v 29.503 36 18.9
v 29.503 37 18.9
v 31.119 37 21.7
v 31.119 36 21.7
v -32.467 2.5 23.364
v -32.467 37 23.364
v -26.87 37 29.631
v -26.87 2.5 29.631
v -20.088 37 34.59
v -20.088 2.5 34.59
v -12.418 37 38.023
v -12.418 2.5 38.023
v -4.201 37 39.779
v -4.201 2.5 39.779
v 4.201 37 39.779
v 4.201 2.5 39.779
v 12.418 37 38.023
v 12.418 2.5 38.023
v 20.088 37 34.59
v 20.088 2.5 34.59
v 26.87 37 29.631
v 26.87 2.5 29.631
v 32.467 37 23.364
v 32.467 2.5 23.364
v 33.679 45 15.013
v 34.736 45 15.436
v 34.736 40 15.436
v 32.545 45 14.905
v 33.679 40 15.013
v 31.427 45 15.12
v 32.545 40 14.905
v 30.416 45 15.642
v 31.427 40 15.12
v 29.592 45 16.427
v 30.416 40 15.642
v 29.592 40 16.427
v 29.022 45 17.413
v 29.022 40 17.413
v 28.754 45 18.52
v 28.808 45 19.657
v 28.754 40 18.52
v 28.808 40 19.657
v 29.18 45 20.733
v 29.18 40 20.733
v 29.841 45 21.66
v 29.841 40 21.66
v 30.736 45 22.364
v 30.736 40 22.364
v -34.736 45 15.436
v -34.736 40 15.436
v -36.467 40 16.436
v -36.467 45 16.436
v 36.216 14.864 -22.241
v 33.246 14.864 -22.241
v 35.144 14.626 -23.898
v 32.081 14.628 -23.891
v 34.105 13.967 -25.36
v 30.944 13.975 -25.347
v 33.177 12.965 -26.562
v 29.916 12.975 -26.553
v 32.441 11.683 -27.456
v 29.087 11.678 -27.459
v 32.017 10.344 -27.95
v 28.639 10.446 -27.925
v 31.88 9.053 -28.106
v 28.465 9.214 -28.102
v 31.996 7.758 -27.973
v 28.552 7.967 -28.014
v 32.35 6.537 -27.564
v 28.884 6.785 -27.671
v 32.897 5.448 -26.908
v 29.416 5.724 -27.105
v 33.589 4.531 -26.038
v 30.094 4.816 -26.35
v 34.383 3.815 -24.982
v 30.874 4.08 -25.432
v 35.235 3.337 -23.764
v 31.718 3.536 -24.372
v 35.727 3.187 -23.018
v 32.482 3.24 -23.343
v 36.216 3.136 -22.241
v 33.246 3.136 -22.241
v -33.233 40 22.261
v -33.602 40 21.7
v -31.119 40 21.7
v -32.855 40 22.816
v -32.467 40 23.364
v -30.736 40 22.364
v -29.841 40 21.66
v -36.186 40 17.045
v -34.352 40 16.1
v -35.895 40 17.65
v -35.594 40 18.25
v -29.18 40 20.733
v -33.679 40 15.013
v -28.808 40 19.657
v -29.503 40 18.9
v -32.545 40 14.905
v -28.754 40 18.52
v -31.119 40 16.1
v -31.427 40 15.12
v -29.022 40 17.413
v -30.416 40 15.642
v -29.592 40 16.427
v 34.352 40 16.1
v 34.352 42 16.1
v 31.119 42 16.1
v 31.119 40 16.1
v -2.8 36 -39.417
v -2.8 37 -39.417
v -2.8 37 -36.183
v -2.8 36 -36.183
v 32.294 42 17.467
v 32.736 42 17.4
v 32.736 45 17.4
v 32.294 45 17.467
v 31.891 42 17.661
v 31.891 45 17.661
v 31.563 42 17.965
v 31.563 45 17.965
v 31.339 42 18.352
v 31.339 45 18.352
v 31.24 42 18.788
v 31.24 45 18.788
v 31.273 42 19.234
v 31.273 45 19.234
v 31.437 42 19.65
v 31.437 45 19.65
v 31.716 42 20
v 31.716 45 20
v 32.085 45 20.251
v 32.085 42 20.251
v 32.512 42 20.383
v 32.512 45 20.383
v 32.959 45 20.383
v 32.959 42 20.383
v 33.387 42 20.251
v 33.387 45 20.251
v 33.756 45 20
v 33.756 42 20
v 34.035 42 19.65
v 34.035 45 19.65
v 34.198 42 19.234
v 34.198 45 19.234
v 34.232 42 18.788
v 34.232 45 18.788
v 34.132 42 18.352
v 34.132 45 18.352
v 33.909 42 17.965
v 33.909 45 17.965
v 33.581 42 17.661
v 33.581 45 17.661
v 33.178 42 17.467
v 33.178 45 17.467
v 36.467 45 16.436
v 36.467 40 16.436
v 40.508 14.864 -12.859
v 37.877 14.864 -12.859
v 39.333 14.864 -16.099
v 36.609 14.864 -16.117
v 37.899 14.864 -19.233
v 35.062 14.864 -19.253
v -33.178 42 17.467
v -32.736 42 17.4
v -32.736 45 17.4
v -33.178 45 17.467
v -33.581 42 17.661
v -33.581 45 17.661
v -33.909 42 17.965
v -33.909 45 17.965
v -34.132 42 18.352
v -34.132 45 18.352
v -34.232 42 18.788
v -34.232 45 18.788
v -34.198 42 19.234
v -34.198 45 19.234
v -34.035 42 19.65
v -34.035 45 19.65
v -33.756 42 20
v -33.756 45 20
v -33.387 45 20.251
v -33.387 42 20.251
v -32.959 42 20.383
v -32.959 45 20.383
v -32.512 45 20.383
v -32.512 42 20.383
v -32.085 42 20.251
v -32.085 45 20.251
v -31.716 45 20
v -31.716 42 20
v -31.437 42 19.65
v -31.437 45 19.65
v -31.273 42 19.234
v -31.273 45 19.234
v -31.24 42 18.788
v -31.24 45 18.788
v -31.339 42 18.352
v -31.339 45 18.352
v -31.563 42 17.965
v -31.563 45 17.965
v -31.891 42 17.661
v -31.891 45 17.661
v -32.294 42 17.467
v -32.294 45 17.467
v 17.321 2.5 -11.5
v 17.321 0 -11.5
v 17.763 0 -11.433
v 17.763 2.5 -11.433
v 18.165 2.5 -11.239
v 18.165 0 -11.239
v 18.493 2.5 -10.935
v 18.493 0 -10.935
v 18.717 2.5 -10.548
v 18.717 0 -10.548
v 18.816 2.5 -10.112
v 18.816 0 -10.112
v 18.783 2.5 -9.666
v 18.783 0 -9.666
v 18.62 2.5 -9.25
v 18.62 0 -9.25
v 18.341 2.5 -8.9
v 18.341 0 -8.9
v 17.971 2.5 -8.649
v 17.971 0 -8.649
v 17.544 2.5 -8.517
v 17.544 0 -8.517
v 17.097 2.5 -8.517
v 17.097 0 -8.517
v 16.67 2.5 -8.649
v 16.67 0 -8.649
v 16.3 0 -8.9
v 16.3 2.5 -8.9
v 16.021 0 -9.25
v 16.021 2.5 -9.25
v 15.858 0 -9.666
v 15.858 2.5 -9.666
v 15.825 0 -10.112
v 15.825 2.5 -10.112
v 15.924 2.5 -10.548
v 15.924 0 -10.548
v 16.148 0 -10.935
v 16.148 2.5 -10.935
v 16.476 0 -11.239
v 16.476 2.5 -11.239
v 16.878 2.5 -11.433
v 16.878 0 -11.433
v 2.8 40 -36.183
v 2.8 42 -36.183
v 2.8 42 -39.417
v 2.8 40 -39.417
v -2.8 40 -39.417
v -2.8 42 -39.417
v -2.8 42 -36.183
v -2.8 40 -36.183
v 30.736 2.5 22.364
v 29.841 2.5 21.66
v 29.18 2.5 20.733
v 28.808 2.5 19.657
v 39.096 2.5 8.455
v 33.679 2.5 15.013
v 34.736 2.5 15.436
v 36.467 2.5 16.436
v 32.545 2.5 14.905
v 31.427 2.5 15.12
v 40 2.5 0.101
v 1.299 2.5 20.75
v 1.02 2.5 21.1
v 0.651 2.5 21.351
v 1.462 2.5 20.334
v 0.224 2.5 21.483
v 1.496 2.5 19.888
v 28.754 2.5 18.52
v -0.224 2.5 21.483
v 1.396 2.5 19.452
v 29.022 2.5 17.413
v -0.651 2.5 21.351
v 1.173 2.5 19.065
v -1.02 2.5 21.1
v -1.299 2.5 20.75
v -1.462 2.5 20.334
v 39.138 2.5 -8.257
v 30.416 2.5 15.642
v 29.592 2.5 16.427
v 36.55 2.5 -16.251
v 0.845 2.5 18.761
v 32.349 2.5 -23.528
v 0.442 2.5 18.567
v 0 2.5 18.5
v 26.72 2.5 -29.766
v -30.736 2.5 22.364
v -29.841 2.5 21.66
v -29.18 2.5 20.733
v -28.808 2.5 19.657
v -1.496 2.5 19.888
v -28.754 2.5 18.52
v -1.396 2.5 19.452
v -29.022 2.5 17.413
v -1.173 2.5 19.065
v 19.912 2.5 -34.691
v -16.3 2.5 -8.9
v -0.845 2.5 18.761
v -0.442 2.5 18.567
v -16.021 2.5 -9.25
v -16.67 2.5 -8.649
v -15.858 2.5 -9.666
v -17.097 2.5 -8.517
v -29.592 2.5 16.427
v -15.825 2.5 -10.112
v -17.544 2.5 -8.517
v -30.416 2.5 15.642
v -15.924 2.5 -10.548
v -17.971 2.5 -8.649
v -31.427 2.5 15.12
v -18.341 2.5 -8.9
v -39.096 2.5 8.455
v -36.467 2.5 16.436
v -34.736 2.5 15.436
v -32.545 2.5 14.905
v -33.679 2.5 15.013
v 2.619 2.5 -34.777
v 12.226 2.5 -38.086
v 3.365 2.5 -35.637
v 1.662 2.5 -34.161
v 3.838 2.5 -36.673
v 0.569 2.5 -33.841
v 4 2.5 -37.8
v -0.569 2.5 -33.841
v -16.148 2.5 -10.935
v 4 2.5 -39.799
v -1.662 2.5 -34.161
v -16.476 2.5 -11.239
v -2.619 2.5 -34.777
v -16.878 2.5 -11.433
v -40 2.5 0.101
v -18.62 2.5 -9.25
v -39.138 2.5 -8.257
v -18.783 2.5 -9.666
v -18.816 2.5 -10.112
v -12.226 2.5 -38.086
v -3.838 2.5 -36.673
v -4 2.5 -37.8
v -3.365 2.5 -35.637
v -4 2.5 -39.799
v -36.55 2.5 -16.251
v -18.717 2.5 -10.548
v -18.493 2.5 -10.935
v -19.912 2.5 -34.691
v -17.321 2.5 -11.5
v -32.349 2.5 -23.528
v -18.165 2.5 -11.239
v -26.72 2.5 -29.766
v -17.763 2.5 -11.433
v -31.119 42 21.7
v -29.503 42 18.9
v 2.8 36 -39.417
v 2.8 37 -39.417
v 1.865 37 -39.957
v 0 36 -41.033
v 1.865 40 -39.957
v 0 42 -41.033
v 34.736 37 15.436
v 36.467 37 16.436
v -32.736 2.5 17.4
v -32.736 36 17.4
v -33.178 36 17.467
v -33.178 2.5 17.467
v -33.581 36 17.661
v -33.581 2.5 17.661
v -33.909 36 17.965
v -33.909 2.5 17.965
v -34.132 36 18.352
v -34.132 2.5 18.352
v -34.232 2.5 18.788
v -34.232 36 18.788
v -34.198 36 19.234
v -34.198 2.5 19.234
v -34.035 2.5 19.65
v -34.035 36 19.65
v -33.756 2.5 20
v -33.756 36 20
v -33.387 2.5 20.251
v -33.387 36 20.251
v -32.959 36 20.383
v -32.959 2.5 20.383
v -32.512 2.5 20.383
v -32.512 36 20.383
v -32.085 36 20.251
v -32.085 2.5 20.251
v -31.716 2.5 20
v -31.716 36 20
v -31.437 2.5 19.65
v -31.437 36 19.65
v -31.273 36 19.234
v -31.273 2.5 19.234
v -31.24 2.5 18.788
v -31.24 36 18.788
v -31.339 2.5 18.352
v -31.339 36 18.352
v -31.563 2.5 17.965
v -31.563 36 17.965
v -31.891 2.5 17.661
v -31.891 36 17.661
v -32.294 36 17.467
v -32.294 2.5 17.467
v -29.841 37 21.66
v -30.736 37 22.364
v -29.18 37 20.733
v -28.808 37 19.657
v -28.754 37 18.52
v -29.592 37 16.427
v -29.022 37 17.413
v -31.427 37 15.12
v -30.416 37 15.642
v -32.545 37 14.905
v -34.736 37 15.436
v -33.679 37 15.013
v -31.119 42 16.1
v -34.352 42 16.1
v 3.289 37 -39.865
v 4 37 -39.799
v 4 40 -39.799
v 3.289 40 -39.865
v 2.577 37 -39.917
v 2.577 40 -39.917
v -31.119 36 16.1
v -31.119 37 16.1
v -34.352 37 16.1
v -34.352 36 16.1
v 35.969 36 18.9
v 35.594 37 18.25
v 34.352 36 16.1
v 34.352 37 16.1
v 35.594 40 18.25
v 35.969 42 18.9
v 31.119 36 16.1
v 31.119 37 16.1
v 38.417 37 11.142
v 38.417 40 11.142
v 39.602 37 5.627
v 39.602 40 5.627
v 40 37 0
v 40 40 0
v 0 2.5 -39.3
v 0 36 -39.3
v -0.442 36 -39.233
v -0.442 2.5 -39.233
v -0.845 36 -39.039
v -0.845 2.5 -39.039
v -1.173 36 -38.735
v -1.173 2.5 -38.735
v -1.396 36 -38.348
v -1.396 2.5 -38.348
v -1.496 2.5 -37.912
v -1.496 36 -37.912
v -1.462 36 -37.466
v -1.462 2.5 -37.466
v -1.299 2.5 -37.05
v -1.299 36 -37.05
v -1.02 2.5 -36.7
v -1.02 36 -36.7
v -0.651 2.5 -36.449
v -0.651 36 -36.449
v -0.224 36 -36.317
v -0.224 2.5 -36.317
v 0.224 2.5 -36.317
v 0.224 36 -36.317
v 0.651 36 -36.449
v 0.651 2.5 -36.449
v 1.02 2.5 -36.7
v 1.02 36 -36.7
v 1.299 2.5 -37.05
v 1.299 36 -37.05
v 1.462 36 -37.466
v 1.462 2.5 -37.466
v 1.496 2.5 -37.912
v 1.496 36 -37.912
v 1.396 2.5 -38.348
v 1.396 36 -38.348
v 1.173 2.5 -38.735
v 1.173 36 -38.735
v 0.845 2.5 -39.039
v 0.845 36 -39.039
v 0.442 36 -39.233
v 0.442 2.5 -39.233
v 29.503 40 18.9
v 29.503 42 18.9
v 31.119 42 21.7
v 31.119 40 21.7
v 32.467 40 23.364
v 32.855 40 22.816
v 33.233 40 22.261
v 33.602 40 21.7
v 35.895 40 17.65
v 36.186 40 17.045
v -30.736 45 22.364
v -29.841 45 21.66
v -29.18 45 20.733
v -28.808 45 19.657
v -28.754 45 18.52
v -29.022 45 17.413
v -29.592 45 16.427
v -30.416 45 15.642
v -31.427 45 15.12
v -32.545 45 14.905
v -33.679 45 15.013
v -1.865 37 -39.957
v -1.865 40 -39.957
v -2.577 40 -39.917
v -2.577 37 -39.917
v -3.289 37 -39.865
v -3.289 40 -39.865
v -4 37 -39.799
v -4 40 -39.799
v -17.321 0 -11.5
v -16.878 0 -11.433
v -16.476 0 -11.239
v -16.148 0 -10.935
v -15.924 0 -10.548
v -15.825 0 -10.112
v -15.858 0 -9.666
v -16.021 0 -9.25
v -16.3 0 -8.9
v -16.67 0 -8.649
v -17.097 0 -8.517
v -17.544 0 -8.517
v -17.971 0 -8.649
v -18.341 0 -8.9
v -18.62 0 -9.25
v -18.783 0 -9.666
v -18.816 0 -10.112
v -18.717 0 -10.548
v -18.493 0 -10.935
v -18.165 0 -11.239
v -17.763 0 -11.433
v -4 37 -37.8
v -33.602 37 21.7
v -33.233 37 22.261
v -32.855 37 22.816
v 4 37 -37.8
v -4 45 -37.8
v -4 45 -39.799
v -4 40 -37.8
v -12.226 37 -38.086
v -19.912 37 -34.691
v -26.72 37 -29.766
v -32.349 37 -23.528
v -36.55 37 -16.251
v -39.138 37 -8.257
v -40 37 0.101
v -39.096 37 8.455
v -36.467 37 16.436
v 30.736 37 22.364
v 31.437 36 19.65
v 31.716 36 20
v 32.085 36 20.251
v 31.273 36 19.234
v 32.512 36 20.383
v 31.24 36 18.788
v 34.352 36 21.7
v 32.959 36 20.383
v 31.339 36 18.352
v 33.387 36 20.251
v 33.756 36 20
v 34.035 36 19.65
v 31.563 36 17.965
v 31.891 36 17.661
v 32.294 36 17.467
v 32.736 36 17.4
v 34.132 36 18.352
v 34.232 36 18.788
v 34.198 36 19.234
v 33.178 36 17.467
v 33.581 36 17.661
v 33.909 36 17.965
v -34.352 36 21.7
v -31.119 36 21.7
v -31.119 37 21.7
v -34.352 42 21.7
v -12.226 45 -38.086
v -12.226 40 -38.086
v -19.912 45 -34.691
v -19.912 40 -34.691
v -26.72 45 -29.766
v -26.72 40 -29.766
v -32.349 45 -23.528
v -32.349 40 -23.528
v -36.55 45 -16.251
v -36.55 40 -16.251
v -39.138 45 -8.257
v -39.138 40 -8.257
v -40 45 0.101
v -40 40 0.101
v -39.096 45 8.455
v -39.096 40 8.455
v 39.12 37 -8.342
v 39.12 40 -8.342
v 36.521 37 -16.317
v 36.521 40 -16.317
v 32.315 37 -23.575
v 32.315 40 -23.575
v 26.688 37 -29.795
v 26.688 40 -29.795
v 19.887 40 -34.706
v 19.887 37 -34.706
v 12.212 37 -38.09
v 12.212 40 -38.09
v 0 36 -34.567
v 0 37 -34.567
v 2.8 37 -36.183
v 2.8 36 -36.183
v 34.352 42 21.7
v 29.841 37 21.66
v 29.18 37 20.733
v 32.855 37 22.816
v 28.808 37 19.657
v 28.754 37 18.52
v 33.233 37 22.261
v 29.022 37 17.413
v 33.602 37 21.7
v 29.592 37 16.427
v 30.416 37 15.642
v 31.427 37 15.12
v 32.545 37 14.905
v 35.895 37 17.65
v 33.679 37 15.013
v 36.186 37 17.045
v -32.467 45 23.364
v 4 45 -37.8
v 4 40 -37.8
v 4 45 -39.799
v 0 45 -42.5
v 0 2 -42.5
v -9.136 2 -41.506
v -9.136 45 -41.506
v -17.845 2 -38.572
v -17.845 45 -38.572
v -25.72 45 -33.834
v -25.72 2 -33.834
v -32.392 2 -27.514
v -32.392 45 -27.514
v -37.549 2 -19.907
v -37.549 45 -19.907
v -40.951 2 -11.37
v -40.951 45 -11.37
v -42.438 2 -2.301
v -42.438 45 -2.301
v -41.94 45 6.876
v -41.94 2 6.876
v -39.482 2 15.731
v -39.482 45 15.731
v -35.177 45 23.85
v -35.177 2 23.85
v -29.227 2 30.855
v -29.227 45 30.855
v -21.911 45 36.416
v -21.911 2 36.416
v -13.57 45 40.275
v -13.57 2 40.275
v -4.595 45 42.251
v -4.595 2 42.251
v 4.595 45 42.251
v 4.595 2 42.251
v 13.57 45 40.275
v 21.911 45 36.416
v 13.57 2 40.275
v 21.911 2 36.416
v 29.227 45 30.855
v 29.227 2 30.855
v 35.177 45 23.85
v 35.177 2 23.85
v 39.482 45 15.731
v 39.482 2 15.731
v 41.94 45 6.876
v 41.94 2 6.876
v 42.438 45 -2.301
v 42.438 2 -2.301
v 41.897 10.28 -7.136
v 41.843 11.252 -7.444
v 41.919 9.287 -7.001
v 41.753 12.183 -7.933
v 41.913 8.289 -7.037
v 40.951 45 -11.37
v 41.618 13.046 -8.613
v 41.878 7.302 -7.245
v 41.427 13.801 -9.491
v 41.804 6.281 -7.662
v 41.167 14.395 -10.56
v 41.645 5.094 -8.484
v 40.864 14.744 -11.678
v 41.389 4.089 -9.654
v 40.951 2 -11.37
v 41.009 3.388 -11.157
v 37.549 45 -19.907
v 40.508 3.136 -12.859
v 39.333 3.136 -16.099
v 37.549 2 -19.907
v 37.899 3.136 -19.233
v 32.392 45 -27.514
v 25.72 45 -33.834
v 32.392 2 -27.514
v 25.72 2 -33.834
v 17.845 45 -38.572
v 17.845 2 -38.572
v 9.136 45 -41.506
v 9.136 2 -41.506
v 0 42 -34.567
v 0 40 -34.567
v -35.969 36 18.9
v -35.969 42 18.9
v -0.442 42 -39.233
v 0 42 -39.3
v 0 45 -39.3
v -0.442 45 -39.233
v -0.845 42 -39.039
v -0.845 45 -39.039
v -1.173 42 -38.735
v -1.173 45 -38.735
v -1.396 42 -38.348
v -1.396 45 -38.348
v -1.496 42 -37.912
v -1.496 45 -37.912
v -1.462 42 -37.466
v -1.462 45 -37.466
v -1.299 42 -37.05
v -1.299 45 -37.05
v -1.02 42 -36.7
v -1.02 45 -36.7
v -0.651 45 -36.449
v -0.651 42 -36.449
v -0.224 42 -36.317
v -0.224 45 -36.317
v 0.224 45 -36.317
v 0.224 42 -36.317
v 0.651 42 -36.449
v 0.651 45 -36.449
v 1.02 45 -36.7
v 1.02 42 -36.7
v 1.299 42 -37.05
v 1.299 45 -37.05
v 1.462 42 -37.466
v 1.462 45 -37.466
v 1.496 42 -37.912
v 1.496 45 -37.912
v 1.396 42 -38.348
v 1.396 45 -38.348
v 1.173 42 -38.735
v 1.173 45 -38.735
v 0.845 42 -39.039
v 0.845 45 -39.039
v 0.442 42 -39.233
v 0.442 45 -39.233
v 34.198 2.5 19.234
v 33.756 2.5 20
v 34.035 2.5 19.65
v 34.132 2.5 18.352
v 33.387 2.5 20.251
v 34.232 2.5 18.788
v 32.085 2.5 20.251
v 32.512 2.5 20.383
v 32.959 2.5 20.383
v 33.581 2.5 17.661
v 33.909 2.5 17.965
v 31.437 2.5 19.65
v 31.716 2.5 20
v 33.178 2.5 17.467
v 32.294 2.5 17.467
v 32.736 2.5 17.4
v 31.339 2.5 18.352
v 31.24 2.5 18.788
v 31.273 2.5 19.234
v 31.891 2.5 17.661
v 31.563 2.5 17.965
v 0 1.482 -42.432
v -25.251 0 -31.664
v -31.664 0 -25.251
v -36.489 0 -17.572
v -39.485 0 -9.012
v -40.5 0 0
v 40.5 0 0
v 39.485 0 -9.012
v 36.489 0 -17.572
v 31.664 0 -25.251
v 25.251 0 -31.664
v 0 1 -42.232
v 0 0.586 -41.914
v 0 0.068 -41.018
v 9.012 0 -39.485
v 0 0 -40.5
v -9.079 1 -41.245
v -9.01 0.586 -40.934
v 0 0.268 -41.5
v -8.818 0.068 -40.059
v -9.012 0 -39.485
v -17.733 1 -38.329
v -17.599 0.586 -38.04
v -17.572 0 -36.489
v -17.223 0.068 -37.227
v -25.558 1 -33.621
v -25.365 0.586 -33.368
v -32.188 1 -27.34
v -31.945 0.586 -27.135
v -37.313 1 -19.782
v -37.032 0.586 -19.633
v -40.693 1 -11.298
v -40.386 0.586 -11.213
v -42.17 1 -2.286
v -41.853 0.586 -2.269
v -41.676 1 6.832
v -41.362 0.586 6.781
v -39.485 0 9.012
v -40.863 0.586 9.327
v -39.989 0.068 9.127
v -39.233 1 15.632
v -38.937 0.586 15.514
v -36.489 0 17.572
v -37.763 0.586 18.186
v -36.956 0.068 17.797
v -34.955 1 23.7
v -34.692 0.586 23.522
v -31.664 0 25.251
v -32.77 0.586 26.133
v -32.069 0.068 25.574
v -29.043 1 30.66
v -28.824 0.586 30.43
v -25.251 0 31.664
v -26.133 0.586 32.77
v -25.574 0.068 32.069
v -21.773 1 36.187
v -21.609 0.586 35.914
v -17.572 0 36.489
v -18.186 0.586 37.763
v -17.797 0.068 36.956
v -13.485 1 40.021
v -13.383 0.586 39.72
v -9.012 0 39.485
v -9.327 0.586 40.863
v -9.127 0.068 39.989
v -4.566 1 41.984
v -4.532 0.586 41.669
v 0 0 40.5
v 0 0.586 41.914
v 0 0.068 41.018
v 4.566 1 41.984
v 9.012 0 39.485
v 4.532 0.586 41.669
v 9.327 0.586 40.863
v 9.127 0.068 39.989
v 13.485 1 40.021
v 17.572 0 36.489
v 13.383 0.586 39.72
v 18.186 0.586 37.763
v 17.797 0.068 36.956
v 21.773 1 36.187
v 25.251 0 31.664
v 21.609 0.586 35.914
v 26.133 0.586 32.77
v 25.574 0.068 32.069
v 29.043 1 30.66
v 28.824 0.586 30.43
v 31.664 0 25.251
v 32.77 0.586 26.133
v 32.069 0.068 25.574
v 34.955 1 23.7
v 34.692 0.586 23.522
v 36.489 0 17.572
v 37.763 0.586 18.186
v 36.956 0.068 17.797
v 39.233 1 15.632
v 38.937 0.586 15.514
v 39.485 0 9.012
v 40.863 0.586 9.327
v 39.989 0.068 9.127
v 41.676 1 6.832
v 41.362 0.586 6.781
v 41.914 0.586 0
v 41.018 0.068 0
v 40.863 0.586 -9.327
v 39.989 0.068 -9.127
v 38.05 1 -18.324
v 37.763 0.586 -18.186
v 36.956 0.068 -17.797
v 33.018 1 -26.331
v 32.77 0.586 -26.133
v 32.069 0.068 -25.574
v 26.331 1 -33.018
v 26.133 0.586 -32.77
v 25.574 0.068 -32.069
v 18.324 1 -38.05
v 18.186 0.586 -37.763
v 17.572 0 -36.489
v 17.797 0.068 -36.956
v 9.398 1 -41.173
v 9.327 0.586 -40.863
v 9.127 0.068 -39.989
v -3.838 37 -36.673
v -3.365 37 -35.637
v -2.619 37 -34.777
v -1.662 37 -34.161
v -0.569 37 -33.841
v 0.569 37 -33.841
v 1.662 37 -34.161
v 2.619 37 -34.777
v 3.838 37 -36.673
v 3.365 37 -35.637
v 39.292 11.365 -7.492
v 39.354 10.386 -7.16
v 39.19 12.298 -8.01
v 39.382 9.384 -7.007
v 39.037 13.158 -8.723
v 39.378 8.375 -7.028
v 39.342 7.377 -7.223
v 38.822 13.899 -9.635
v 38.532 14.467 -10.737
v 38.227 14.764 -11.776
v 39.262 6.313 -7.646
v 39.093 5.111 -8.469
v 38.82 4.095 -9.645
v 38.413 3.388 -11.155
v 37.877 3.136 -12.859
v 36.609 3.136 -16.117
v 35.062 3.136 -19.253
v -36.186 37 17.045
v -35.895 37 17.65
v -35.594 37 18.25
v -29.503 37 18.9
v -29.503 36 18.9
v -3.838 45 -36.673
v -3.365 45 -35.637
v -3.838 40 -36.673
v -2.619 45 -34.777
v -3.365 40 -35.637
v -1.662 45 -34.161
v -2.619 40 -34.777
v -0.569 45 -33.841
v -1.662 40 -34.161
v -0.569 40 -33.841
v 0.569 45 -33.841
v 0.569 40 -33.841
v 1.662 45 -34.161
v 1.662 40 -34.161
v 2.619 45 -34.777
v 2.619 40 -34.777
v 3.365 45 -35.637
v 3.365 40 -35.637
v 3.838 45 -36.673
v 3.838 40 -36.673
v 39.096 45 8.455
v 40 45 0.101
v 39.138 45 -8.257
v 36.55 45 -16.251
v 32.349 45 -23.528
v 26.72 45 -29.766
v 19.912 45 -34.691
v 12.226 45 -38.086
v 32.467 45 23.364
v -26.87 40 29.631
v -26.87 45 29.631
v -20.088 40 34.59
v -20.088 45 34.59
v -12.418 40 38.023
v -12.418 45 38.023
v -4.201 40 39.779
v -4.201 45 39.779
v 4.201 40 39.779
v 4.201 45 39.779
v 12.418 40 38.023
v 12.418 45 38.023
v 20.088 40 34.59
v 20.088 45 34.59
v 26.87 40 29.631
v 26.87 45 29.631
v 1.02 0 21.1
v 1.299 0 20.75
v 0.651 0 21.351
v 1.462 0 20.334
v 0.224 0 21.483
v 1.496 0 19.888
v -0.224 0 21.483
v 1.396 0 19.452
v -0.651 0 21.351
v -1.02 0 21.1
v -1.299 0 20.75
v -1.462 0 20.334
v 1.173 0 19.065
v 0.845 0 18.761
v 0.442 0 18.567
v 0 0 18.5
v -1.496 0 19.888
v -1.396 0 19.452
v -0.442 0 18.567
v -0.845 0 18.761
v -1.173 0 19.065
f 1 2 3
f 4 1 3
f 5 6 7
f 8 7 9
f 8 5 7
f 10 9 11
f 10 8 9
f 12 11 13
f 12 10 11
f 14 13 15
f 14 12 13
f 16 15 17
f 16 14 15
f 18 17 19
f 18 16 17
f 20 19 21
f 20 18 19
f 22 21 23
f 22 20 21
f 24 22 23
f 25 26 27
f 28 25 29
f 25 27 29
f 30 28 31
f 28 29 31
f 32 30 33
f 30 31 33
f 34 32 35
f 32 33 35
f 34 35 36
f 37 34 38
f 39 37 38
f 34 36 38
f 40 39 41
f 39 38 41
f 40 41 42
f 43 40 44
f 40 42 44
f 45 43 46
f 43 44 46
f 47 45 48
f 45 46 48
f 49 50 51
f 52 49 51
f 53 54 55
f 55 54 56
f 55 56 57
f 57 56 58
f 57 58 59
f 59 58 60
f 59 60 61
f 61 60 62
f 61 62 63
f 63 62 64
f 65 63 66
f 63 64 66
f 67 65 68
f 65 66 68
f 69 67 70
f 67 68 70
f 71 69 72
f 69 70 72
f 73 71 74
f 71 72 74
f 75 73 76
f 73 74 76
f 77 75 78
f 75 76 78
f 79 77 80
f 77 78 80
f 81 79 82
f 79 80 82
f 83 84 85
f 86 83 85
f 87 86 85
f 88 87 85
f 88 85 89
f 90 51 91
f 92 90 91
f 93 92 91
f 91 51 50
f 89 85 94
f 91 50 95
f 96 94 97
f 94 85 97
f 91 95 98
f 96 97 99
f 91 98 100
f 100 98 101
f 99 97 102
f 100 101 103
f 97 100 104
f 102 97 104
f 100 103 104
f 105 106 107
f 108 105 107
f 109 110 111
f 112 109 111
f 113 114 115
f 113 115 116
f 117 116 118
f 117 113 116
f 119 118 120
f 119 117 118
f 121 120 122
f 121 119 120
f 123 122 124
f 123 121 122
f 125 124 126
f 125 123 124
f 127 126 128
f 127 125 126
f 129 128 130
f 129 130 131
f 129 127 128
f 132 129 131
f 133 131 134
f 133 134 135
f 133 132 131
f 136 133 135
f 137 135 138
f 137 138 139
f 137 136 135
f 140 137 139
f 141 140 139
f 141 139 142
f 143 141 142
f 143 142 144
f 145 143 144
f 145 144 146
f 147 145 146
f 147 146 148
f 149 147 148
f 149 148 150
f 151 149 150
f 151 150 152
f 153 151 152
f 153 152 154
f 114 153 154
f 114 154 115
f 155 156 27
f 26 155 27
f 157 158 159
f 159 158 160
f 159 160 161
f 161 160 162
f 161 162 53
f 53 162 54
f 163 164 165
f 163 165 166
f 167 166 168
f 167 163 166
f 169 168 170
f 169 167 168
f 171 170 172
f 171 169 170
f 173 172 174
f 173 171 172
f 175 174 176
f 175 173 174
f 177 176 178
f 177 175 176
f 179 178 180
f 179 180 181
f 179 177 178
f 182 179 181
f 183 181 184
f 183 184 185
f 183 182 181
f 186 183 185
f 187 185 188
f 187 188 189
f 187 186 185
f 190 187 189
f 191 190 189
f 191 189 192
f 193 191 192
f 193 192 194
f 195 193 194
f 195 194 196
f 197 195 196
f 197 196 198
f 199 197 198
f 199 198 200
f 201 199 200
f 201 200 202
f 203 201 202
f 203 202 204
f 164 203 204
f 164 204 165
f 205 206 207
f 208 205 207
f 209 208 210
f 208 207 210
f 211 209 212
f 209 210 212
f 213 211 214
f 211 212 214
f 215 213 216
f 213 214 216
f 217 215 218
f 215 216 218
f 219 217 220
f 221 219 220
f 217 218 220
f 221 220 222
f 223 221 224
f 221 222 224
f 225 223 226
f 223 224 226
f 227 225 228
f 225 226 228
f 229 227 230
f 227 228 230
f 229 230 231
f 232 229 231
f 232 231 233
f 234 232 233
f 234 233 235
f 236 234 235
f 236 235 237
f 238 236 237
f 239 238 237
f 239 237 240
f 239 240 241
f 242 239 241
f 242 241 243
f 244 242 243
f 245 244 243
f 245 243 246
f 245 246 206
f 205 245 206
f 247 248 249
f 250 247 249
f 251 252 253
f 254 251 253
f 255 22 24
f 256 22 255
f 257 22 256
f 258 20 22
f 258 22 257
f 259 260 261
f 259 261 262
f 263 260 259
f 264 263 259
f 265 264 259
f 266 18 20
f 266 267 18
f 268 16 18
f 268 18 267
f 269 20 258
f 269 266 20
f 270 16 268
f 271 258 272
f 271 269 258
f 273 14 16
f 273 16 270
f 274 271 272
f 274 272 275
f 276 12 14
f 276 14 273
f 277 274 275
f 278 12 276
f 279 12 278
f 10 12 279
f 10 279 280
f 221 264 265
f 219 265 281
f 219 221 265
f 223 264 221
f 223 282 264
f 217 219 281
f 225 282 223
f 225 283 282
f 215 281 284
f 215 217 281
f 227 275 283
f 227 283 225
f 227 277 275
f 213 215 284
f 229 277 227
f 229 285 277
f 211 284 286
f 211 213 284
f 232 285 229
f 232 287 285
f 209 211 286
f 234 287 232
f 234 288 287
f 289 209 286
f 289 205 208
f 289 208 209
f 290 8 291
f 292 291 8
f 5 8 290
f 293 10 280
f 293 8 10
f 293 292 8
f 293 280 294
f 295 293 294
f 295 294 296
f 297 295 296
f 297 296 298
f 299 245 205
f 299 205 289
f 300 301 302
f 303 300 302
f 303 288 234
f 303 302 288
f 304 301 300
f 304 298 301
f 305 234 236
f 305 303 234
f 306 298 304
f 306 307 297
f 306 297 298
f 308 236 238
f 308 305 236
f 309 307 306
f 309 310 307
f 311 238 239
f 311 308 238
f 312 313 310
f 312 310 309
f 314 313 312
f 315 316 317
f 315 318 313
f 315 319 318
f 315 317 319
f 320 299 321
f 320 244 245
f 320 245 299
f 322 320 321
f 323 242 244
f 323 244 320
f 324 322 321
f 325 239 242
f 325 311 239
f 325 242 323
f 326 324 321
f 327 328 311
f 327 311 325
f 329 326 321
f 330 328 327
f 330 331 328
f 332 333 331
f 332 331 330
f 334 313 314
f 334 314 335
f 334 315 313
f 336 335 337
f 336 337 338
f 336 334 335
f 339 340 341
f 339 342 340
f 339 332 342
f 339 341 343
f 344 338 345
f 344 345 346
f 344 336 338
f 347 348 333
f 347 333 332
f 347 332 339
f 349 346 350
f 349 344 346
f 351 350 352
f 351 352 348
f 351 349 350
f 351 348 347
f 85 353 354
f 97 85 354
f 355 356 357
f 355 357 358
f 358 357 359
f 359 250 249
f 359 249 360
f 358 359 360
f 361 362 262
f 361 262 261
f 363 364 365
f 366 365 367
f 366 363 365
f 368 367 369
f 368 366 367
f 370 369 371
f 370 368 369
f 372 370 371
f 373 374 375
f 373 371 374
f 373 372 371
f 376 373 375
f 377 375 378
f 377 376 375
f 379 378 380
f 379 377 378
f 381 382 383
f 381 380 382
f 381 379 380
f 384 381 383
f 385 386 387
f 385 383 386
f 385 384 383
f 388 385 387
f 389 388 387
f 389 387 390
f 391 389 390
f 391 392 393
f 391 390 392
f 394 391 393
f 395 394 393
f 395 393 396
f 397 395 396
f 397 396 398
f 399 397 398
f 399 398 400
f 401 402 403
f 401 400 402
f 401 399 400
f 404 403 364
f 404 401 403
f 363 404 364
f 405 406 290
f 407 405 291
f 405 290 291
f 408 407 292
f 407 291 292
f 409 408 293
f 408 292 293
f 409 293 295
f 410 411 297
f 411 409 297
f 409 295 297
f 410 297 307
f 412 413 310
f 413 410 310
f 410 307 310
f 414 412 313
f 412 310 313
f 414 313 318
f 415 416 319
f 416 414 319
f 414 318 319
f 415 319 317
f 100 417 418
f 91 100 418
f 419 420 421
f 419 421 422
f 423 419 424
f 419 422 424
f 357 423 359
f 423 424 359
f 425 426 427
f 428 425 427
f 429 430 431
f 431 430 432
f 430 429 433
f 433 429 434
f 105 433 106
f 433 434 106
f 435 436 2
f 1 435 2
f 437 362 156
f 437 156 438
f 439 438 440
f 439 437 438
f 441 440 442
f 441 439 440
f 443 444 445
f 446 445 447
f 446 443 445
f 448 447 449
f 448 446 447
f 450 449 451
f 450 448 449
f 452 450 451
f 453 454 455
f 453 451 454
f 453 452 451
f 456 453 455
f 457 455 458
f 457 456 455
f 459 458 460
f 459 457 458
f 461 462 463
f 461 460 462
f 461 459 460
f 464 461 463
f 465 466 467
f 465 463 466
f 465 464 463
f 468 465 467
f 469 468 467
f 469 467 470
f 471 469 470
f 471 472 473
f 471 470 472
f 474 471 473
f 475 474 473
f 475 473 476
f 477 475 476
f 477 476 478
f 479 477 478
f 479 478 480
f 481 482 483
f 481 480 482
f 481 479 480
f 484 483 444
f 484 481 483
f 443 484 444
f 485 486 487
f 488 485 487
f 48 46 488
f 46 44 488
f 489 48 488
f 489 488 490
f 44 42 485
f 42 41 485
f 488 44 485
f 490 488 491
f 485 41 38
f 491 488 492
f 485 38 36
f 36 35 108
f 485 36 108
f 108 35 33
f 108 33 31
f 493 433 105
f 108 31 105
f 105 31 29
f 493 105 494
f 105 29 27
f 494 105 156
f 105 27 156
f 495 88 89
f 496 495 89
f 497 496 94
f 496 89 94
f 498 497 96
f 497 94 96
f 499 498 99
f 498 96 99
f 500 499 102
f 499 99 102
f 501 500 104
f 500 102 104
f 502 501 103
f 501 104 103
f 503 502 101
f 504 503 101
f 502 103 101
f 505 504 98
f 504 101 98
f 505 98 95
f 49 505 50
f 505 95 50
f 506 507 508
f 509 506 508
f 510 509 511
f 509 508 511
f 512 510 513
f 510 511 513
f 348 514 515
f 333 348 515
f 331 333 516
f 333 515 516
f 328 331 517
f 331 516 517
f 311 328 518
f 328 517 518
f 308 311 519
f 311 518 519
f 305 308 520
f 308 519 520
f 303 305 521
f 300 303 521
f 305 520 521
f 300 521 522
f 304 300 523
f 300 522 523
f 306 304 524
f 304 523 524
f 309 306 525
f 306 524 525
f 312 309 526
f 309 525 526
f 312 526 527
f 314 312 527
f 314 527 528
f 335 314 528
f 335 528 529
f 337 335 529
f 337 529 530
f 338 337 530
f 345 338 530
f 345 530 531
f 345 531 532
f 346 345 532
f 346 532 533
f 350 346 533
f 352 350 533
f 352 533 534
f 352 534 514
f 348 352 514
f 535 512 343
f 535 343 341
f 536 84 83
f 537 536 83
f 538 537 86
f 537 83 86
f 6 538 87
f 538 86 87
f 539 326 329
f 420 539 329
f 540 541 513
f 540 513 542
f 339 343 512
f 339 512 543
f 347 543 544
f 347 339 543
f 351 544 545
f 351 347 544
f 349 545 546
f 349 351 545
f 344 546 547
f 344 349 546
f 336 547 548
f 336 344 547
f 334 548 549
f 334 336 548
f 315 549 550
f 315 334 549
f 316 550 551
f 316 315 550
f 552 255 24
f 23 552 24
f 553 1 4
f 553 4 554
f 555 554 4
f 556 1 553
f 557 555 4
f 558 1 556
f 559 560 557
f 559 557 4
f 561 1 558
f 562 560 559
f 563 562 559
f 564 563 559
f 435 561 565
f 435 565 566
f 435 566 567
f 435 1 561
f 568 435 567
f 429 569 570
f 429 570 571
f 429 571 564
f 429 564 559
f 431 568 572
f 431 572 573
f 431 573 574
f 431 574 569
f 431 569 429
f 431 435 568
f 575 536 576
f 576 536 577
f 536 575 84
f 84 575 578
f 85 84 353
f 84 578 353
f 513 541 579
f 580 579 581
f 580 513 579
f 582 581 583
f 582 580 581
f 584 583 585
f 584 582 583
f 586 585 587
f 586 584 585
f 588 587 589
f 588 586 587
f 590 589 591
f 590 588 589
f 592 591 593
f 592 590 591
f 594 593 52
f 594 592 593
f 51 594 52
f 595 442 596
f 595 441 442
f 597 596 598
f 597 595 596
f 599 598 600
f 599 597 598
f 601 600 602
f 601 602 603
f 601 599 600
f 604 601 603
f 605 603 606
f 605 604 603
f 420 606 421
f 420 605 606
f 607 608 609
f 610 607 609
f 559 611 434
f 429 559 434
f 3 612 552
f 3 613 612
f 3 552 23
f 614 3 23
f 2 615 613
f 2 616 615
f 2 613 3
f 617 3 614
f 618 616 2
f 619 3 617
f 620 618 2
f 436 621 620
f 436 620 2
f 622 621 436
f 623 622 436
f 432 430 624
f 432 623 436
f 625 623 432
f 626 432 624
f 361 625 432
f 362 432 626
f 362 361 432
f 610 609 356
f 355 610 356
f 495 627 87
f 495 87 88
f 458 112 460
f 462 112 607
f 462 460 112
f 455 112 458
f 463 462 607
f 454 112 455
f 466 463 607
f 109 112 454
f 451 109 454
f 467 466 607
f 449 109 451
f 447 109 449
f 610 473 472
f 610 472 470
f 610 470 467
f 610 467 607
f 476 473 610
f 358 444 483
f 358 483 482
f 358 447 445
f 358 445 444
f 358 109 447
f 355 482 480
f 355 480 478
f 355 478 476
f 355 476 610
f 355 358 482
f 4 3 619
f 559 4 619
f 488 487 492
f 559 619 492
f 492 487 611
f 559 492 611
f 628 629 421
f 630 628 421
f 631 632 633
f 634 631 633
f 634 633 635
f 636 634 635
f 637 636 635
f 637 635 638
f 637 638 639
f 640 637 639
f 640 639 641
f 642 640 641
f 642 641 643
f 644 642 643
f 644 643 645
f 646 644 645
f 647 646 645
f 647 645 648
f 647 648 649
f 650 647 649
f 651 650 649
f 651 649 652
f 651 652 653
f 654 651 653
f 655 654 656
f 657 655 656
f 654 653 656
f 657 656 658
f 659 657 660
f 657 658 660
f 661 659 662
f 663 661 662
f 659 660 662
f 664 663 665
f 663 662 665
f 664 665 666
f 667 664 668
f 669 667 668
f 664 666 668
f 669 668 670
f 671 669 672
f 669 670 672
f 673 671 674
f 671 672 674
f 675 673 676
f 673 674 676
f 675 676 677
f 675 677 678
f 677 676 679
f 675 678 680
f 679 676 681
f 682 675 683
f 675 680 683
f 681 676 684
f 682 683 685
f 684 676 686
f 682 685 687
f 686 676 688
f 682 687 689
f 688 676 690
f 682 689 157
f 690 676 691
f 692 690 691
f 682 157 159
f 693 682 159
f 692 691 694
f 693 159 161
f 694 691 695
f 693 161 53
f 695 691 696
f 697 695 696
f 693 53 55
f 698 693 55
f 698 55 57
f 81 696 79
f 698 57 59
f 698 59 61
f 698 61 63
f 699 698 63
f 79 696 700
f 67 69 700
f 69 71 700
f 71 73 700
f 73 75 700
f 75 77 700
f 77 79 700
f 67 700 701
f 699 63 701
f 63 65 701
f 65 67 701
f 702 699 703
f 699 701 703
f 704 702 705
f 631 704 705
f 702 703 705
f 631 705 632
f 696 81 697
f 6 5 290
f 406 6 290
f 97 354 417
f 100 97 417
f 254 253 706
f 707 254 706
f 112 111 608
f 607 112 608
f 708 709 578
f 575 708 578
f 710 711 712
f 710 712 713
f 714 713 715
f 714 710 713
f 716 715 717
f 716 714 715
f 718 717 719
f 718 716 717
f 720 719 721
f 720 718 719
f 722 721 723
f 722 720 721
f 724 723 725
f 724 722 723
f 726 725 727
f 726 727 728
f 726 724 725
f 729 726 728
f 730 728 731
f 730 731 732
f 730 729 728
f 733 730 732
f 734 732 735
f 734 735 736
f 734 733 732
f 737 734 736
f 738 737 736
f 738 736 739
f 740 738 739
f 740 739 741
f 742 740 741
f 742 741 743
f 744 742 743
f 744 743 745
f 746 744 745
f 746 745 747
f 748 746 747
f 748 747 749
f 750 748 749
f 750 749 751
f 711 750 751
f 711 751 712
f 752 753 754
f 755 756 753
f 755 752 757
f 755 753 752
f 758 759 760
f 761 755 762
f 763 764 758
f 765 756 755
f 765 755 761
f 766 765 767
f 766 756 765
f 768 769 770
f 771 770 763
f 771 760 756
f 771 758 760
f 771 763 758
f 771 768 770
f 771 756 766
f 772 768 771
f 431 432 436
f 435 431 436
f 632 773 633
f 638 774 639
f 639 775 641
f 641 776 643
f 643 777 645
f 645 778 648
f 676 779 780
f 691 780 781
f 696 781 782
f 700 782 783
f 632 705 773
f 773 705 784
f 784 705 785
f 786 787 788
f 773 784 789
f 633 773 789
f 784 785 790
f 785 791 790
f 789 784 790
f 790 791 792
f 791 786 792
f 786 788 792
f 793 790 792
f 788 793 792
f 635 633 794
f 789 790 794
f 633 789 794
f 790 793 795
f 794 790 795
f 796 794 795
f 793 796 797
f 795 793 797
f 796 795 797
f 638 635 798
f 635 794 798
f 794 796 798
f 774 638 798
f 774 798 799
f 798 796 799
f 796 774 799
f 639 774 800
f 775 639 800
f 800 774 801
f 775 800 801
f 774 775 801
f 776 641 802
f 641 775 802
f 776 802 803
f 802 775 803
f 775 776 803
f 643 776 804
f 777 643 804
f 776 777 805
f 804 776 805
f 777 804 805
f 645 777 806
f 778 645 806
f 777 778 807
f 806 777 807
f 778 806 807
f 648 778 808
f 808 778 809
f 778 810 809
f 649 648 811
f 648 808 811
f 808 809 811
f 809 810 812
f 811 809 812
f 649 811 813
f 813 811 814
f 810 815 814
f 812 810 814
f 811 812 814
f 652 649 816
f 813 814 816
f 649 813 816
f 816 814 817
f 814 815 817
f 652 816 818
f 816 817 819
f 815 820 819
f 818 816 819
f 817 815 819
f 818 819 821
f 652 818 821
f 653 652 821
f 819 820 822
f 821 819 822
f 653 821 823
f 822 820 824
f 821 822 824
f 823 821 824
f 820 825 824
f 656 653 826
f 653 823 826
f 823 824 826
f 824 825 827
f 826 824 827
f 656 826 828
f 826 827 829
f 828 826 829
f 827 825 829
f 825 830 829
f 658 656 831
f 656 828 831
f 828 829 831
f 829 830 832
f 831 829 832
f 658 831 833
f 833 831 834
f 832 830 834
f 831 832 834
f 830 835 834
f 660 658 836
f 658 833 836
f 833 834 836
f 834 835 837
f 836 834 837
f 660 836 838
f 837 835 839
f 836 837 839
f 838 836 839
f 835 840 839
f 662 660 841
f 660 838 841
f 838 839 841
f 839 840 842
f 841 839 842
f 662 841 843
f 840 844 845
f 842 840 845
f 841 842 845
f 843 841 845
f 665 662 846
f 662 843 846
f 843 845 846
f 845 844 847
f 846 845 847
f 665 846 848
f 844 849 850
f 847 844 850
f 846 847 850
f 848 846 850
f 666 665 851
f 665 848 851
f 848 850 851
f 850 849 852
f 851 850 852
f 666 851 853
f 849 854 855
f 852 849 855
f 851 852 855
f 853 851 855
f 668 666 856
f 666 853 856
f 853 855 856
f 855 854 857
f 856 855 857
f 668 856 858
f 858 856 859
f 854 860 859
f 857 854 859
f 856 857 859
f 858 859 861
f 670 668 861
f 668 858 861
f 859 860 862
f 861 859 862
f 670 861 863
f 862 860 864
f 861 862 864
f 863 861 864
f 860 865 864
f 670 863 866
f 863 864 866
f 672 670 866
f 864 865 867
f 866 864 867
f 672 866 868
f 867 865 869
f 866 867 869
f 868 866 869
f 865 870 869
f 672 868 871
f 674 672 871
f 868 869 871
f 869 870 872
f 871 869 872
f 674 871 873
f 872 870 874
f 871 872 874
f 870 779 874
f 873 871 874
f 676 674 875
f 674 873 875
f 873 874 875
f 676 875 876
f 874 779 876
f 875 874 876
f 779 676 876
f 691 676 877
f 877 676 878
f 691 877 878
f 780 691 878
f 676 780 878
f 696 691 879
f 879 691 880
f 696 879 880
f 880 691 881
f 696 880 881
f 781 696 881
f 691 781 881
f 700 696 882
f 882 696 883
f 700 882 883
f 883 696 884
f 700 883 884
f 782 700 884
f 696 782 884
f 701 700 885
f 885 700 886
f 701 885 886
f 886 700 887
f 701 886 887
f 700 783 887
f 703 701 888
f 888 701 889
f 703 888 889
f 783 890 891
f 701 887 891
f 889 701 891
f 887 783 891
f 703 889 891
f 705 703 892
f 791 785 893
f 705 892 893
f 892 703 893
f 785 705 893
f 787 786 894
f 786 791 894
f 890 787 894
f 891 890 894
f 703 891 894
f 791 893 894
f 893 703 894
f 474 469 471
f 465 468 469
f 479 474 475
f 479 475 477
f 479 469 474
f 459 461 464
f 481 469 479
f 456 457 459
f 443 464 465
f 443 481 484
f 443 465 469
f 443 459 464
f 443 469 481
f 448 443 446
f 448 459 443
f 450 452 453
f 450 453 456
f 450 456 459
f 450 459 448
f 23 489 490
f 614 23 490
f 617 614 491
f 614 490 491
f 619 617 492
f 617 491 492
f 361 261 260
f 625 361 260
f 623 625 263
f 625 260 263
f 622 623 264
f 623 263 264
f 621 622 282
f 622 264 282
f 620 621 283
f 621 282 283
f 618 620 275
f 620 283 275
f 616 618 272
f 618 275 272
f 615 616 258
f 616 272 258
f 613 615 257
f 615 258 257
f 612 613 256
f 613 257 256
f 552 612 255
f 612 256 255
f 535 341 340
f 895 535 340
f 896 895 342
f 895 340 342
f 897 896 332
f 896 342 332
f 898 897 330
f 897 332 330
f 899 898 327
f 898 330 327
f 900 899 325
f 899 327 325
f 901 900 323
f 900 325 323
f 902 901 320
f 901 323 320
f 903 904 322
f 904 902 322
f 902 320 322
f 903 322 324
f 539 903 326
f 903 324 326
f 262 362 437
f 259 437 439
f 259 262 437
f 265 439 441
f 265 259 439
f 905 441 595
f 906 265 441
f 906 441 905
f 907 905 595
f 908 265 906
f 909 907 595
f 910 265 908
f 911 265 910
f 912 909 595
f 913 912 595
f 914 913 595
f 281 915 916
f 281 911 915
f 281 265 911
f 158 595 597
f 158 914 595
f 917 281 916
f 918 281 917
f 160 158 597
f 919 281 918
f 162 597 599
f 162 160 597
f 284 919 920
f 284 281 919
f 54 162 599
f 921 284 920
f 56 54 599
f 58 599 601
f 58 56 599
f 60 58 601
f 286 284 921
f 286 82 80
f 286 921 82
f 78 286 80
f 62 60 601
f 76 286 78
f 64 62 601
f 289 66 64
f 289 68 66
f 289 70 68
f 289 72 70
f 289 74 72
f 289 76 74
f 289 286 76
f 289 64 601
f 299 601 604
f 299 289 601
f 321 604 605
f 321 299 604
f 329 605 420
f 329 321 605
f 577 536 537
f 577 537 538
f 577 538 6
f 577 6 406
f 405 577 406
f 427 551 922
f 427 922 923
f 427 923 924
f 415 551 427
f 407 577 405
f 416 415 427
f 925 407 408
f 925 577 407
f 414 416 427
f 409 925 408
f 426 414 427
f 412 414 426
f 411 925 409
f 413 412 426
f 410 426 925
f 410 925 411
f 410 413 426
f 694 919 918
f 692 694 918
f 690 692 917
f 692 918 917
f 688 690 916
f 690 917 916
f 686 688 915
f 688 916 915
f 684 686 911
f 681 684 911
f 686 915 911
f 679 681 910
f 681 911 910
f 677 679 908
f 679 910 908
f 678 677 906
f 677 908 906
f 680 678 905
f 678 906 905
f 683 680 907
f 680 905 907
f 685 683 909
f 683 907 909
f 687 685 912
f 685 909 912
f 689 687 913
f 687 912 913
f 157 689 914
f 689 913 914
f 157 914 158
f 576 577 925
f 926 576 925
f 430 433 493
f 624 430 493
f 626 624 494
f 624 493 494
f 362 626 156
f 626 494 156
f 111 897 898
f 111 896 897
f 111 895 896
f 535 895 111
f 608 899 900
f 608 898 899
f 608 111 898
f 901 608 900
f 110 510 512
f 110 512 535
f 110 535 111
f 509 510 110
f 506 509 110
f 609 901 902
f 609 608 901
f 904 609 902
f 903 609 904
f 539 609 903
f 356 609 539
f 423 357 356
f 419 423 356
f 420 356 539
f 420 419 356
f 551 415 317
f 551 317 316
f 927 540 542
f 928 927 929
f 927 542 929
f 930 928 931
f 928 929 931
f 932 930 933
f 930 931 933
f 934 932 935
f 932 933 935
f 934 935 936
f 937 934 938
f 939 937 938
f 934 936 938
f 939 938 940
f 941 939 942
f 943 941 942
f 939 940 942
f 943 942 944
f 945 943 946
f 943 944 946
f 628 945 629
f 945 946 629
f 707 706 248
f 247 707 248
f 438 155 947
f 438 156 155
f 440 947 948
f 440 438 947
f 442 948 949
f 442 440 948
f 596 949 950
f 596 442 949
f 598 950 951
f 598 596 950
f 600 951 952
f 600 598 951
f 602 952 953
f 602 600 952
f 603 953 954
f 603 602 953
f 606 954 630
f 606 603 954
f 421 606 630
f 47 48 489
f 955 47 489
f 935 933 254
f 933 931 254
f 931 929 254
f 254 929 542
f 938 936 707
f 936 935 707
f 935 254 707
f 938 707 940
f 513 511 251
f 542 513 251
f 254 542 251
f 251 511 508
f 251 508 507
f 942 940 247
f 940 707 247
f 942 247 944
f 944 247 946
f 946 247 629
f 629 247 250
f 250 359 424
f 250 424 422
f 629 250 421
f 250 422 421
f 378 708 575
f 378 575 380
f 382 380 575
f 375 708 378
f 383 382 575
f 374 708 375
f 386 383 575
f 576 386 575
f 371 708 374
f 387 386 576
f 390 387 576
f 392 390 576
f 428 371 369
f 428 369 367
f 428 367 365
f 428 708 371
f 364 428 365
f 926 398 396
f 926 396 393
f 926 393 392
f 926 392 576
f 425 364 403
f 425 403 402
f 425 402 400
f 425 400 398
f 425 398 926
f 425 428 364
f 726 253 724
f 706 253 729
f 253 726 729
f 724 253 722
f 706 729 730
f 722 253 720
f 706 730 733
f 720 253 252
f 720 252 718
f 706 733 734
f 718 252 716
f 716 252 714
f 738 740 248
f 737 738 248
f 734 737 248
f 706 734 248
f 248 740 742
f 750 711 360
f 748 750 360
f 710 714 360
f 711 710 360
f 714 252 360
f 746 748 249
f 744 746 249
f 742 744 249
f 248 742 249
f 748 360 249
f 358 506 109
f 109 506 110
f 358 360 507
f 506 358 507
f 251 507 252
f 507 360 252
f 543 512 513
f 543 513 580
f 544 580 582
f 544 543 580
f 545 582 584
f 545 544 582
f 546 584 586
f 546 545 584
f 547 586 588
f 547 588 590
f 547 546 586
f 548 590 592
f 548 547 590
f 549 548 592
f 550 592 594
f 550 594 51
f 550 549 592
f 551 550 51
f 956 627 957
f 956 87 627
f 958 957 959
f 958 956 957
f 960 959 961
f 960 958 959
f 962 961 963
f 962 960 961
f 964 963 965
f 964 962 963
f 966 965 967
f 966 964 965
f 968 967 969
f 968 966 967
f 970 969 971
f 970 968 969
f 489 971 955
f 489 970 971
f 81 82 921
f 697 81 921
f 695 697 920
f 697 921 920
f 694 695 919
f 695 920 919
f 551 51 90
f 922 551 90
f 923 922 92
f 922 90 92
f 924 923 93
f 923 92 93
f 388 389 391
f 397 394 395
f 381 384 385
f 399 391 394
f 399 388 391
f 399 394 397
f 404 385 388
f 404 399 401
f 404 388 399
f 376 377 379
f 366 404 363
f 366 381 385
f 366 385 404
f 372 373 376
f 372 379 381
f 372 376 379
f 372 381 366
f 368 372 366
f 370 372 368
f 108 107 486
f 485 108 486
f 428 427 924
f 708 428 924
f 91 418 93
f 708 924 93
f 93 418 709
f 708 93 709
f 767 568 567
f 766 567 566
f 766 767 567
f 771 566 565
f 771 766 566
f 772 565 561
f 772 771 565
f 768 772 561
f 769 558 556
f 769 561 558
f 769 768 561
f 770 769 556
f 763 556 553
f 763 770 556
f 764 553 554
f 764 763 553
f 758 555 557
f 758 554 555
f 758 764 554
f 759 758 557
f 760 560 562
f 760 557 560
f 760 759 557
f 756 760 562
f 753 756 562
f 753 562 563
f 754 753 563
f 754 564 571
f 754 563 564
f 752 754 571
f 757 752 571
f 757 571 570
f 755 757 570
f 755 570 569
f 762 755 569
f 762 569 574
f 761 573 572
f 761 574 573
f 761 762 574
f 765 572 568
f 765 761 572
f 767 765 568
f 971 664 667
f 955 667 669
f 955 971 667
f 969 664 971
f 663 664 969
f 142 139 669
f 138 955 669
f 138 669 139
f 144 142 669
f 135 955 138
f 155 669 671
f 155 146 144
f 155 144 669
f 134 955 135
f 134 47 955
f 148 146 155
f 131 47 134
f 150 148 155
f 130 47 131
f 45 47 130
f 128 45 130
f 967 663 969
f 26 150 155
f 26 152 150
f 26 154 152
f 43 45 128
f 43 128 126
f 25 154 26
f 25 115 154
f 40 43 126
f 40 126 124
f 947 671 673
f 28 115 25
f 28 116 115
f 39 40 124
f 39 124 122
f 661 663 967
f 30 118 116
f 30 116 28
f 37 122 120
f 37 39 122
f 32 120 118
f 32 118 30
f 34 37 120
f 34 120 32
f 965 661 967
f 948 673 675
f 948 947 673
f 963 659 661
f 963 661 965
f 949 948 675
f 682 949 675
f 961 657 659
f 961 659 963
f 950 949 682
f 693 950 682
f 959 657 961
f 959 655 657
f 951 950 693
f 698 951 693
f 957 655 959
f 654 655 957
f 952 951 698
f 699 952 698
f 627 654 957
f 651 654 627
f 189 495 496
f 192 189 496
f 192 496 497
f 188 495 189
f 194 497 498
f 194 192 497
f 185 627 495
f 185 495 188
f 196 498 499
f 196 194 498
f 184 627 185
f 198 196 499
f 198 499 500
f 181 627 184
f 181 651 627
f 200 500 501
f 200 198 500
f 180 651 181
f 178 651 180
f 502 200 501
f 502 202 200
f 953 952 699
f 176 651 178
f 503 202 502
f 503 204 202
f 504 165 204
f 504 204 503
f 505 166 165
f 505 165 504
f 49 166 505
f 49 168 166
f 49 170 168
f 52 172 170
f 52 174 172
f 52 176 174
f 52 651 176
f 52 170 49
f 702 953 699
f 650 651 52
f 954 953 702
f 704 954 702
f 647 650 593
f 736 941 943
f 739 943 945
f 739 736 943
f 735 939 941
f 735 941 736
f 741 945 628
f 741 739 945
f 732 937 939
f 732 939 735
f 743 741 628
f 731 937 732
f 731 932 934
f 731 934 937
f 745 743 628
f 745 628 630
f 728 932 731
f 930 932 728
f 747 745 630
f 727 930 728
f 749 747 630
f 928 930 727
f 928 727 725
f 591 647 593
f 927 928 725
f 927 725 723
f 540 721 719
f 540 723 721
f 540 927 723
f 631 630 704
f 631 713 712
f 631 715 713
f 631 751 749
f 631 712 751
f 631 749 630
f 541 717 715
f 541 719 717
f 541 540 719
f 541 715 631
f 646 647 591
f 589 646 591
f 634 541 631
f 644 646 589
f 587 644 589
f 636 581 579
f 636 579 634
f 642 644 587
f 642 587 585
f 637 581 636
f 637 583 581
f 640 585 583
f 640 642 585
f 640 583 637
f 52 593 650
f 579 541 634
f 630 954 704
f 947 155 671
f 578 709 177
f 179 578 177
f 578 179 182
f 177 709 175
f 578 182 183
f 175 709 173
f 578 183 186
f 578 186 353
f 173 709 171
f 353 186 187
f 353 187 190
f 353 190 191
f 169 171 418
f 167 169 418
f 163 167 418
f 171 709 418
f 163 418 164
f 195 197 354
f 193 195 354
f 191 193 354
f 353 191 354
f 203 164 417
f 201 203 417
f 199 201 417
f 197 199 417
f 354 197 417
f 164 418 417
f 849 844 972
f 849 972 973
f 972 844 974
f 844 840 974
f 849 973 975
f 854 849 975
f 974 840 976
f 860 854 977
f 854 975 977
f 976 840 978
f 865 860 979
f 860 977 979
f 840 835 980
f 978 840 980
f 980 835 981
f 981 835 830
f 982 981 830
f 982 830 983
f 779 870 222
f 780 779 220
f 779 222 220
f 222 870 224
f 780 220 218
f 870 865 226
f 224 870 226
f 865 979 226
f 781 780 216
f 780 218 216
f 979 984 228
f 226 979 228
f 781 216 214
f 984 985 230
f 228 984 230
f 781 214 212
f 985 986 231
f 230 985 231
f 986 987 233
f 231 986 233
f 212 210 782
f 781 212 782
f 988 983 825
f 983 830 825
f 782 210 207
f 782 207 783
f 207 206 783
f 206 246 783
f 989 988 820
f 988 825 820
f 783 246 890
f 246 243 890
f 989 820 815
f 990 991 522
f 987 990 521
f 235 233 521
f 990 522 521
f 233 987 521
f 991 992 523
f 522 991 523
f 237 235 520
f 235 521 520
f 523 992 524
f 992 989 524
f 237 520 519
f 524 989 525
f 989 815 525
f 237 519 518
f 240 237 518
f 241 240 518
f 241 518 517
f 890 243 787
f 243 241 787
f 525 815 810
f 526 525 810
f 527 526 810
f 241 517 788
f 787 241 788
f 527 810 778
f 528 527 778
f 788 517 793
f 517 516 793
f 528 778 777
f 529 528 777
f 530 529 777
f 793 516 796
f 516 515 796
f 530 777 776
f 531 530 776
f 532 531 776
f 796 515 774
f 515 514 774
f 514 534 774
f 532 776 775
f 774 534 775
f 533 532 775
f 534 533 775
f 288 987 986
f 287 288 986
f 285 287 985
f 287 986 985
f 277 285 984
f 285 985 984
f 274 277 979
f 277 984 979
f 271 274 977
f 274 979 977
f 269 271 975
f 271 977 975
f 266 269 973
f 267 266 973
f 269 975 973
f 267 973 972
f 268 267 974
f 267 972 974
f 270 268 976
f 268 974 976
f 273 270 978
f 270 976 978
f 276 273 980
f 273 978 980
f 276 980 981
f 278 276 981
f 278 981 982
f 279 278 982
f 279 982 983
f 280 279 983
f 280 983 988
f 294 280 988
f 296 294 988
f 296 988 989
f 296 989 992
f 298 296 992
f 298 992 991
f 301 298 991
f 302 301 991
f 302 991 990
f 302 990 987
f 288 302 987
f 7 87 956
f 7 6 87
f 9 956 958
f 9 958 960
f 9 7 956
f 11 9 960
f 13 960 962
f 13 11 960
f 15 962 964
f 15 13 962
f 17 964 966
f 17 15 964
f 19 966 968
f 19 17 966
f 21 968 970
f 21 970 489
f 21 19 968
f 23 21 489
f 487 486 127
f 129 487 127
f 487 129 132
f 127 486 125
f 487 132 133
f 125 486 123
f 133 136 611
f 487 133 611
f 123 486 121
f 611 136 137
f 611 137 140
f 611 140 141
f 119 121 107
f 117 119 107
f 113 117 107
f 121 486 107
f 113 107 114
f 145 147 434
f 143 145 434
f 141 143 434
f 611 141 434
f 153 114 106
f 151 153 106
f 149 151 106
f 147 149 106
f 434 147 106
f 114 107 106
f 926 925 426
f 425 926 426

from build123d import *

# Parameters (mm, degrees)
SKETCH1_R           = 42.5
BOSS_EXTRUDE1_DEPTH = 45
FILLET1_R           = 2
SHELL1_T            = -2.5
SKETCH2_R           = 1.5
BOSS_EXTRUDE2_DEPTH = 42.5
CUT_EXTRUDE1_START  = -3
CUT_EXTRUDE1_DEPTH  = 6
CUT_EXTRUDE2_START  = -5
SKETCH4_R           = 40
CUT_EXTRUDE2_DEPTH  = 3
CUT_EXTRUDE3_DEPTH  = 120
SKETCH7_R           = 1.5
CUT_EXTRUDE4_DEPTH  = 10


with BuildPart() as part:
    # Sketch1 → Boss-Extrude1 (new body)
    with BuildSketch(Plane(origin=(0, 0, 0), x_dir=(1, 0, 0), z_dir=(0, 1, 0))):
        with Locations(Location((0, 0, 0), (0, 0, 90))):
            Circle(SKETCH1_R)
    extrude(amount=BOSS_EXTRUDE1_DEPTH)

    # Fillet1
    fillet1_edges = [part.edges().sort_by_distance(p)[0] for p in [
        (0, 0, 42.5),
    ]]
    fillet(fillet1_edges, radius=FILLET1_R)

    # Shell1
    shell1_openings = [part.faces().sort_by_distance(p)[0] for p in [
        (0, 45, 0),
    ]]
    offset(amount=SHELL1_T, openings=shell1_openings, kind=Kind.INTERSECTION)

    # Sketch2 → Boss-Extrude2 (add)
    with BuildSketch(Plane(origin=(0, 2.5, 0), x_dir=(1, 0, 0), z_dir=(0, 1, 0))):
        with BuildLine():
            Line((-34.080943597, -24.295444113), (-30.735760263, -22.364101615))
            ThreePointArc((-30.735760263, -22.364101615), (-29.271658648, -16.9), (-34.735760263, -15.435898385))
            Line((-34.735760263, -15.435898385), (-38.080943597, -17.367240883))
            Line((-38.080943597, -17.367240883), (-34.080943597, -24.295444113))
        make_face()
        with Locations(Location((-32.735760263, -18.9, 0), (0, 0, 90))):
            Circle(SKETCH2_R, mode=Mode.SUBTRACT)
        with BuildLine():
            Line((38.080943597, -17.367240883), (34.735760263, -15.435898385))
            ThreePointArc((34.735760263, -15.435898385), (29.271658648, -16.9), (30.735760263, -22.364101615))
            Line((30.735760263, -22.364101615), (34.080943597, -24.295444113))
            Line((34.080943597, -24.295444113), (38.080943597, -17.367240883))
        make_face()
        with Locations(Location((32.735760263, -18.9, 0), (0, 0, 90))):
            Circle(SKETCH2_R, mode=Mode.SUBTRACT)
        with BuildLine():
            Line((-4, 41.662684996), (-4, 37.8))
            ThreePointArc((-4, 37.8), (0, 33.8), (4, 37.8))
            Line((4, 37.8), (4, 41.662684996))
            Line((4, 41.662684996), (-4, 41.662684996))
        make_face()
        with Locations(Location((0, 37.8, 0), (0, 0, 90))):
            Circle(SKETCH2_R, mode=Mode.SUBTRACT)
    extrude(amount=BOSS_EXTRUDE2_DEPTH)

    # Sketch3 → Cut-Extrude1 (cut)
    with BuildSketch(Plane(origin=(0, 45, 0), x_dir=(1, 0, 0), z_dir=(0, 1, 0)).offset(CUT_EXTRUDE1_START)):
        Polygon((-31.119179509, -16.1), (-34.352341017, -16.1), (-35.968921771, -18.9), (-34.352341017, -21.7), (-31.119179509, -21.7), (-29.502598756, -18.9), align=None)
        Polygon((0, 41.033161507), (-2.8, 39.416580754), (-2.8, 36.183419246), (0, 34.566838493), (2.8, 36.183419246), (2.8, 39.416580754), align=None)
        Polygon((34.352341017, -16.1), (31.119179509, -16.1), (29.502598756, -18.9), (31.119179509, -21.7), (34.352341017, -21.7), (35.968921771, -18.9), align=None)
    extrude(amount=-CUT_EXTRUDE1_DEPTH, mode=Mode.SUBTRACT)

    # Sketch4 → Cut-Extrude2 (cut)
    with BuildSketch(Plane(origin=(0, 45, 0), x_dir=(1, 0, 0), z_dir=(0, 1, 0)).offset(CUT_EXTRUDE2_START)):
        Circle(SKETCH4_R)
    extrude(amount=-CUT_EXTRUDE2_DEPTH, mode=Mode.SUBTRACT)

    # Sketch6 → Cut-Extrude3 (cut)
    with BuildSketch(Plane(origin=(0, 0, 0), x_dir=(0, 0, -1), z_dir=(1, 0, 0))):
        with BuildLine():
            Line((12.858520148, 14.864349815), (22.241479852, 14.864349815))
            ThreePointArc((22.241479852, 14.864349815), (28.105829667, 9), (22.241479852, 3.135650185))
            Line((22.241479852, 3.135650185), (12.858520148, 3.135650185))
            ThreePointArc((12.858520148, 3.135650185), (6.994170333, 9), (12.858520148, 14.864349815))
        make_face()
    extrude(amount=CUT_EXTRUDE3_DEPTH, mode=Mode.SUBTRACT)

    # Sketch7 → Cut-Extrude4 (cut)
    with BuildSketch(Plane.XZ):
        with Locations(Location((17.320508076, -10, 0), (0, 0, 270))):
            Circle(SKETCH7_R)
        with Locations(Location((0, 20, 0), (0, 0, 270))):
            Circle(SKETCH7_R)
        with Locations(Location((-17.320508076, -10, 0), (0, 0, 270))):
            Circle(SKETCH7_R)
    extrude(amount=-CUT_EXTRUDE4_DEPTH, mode=Mode.SUBTRACT)


solid = part.part
